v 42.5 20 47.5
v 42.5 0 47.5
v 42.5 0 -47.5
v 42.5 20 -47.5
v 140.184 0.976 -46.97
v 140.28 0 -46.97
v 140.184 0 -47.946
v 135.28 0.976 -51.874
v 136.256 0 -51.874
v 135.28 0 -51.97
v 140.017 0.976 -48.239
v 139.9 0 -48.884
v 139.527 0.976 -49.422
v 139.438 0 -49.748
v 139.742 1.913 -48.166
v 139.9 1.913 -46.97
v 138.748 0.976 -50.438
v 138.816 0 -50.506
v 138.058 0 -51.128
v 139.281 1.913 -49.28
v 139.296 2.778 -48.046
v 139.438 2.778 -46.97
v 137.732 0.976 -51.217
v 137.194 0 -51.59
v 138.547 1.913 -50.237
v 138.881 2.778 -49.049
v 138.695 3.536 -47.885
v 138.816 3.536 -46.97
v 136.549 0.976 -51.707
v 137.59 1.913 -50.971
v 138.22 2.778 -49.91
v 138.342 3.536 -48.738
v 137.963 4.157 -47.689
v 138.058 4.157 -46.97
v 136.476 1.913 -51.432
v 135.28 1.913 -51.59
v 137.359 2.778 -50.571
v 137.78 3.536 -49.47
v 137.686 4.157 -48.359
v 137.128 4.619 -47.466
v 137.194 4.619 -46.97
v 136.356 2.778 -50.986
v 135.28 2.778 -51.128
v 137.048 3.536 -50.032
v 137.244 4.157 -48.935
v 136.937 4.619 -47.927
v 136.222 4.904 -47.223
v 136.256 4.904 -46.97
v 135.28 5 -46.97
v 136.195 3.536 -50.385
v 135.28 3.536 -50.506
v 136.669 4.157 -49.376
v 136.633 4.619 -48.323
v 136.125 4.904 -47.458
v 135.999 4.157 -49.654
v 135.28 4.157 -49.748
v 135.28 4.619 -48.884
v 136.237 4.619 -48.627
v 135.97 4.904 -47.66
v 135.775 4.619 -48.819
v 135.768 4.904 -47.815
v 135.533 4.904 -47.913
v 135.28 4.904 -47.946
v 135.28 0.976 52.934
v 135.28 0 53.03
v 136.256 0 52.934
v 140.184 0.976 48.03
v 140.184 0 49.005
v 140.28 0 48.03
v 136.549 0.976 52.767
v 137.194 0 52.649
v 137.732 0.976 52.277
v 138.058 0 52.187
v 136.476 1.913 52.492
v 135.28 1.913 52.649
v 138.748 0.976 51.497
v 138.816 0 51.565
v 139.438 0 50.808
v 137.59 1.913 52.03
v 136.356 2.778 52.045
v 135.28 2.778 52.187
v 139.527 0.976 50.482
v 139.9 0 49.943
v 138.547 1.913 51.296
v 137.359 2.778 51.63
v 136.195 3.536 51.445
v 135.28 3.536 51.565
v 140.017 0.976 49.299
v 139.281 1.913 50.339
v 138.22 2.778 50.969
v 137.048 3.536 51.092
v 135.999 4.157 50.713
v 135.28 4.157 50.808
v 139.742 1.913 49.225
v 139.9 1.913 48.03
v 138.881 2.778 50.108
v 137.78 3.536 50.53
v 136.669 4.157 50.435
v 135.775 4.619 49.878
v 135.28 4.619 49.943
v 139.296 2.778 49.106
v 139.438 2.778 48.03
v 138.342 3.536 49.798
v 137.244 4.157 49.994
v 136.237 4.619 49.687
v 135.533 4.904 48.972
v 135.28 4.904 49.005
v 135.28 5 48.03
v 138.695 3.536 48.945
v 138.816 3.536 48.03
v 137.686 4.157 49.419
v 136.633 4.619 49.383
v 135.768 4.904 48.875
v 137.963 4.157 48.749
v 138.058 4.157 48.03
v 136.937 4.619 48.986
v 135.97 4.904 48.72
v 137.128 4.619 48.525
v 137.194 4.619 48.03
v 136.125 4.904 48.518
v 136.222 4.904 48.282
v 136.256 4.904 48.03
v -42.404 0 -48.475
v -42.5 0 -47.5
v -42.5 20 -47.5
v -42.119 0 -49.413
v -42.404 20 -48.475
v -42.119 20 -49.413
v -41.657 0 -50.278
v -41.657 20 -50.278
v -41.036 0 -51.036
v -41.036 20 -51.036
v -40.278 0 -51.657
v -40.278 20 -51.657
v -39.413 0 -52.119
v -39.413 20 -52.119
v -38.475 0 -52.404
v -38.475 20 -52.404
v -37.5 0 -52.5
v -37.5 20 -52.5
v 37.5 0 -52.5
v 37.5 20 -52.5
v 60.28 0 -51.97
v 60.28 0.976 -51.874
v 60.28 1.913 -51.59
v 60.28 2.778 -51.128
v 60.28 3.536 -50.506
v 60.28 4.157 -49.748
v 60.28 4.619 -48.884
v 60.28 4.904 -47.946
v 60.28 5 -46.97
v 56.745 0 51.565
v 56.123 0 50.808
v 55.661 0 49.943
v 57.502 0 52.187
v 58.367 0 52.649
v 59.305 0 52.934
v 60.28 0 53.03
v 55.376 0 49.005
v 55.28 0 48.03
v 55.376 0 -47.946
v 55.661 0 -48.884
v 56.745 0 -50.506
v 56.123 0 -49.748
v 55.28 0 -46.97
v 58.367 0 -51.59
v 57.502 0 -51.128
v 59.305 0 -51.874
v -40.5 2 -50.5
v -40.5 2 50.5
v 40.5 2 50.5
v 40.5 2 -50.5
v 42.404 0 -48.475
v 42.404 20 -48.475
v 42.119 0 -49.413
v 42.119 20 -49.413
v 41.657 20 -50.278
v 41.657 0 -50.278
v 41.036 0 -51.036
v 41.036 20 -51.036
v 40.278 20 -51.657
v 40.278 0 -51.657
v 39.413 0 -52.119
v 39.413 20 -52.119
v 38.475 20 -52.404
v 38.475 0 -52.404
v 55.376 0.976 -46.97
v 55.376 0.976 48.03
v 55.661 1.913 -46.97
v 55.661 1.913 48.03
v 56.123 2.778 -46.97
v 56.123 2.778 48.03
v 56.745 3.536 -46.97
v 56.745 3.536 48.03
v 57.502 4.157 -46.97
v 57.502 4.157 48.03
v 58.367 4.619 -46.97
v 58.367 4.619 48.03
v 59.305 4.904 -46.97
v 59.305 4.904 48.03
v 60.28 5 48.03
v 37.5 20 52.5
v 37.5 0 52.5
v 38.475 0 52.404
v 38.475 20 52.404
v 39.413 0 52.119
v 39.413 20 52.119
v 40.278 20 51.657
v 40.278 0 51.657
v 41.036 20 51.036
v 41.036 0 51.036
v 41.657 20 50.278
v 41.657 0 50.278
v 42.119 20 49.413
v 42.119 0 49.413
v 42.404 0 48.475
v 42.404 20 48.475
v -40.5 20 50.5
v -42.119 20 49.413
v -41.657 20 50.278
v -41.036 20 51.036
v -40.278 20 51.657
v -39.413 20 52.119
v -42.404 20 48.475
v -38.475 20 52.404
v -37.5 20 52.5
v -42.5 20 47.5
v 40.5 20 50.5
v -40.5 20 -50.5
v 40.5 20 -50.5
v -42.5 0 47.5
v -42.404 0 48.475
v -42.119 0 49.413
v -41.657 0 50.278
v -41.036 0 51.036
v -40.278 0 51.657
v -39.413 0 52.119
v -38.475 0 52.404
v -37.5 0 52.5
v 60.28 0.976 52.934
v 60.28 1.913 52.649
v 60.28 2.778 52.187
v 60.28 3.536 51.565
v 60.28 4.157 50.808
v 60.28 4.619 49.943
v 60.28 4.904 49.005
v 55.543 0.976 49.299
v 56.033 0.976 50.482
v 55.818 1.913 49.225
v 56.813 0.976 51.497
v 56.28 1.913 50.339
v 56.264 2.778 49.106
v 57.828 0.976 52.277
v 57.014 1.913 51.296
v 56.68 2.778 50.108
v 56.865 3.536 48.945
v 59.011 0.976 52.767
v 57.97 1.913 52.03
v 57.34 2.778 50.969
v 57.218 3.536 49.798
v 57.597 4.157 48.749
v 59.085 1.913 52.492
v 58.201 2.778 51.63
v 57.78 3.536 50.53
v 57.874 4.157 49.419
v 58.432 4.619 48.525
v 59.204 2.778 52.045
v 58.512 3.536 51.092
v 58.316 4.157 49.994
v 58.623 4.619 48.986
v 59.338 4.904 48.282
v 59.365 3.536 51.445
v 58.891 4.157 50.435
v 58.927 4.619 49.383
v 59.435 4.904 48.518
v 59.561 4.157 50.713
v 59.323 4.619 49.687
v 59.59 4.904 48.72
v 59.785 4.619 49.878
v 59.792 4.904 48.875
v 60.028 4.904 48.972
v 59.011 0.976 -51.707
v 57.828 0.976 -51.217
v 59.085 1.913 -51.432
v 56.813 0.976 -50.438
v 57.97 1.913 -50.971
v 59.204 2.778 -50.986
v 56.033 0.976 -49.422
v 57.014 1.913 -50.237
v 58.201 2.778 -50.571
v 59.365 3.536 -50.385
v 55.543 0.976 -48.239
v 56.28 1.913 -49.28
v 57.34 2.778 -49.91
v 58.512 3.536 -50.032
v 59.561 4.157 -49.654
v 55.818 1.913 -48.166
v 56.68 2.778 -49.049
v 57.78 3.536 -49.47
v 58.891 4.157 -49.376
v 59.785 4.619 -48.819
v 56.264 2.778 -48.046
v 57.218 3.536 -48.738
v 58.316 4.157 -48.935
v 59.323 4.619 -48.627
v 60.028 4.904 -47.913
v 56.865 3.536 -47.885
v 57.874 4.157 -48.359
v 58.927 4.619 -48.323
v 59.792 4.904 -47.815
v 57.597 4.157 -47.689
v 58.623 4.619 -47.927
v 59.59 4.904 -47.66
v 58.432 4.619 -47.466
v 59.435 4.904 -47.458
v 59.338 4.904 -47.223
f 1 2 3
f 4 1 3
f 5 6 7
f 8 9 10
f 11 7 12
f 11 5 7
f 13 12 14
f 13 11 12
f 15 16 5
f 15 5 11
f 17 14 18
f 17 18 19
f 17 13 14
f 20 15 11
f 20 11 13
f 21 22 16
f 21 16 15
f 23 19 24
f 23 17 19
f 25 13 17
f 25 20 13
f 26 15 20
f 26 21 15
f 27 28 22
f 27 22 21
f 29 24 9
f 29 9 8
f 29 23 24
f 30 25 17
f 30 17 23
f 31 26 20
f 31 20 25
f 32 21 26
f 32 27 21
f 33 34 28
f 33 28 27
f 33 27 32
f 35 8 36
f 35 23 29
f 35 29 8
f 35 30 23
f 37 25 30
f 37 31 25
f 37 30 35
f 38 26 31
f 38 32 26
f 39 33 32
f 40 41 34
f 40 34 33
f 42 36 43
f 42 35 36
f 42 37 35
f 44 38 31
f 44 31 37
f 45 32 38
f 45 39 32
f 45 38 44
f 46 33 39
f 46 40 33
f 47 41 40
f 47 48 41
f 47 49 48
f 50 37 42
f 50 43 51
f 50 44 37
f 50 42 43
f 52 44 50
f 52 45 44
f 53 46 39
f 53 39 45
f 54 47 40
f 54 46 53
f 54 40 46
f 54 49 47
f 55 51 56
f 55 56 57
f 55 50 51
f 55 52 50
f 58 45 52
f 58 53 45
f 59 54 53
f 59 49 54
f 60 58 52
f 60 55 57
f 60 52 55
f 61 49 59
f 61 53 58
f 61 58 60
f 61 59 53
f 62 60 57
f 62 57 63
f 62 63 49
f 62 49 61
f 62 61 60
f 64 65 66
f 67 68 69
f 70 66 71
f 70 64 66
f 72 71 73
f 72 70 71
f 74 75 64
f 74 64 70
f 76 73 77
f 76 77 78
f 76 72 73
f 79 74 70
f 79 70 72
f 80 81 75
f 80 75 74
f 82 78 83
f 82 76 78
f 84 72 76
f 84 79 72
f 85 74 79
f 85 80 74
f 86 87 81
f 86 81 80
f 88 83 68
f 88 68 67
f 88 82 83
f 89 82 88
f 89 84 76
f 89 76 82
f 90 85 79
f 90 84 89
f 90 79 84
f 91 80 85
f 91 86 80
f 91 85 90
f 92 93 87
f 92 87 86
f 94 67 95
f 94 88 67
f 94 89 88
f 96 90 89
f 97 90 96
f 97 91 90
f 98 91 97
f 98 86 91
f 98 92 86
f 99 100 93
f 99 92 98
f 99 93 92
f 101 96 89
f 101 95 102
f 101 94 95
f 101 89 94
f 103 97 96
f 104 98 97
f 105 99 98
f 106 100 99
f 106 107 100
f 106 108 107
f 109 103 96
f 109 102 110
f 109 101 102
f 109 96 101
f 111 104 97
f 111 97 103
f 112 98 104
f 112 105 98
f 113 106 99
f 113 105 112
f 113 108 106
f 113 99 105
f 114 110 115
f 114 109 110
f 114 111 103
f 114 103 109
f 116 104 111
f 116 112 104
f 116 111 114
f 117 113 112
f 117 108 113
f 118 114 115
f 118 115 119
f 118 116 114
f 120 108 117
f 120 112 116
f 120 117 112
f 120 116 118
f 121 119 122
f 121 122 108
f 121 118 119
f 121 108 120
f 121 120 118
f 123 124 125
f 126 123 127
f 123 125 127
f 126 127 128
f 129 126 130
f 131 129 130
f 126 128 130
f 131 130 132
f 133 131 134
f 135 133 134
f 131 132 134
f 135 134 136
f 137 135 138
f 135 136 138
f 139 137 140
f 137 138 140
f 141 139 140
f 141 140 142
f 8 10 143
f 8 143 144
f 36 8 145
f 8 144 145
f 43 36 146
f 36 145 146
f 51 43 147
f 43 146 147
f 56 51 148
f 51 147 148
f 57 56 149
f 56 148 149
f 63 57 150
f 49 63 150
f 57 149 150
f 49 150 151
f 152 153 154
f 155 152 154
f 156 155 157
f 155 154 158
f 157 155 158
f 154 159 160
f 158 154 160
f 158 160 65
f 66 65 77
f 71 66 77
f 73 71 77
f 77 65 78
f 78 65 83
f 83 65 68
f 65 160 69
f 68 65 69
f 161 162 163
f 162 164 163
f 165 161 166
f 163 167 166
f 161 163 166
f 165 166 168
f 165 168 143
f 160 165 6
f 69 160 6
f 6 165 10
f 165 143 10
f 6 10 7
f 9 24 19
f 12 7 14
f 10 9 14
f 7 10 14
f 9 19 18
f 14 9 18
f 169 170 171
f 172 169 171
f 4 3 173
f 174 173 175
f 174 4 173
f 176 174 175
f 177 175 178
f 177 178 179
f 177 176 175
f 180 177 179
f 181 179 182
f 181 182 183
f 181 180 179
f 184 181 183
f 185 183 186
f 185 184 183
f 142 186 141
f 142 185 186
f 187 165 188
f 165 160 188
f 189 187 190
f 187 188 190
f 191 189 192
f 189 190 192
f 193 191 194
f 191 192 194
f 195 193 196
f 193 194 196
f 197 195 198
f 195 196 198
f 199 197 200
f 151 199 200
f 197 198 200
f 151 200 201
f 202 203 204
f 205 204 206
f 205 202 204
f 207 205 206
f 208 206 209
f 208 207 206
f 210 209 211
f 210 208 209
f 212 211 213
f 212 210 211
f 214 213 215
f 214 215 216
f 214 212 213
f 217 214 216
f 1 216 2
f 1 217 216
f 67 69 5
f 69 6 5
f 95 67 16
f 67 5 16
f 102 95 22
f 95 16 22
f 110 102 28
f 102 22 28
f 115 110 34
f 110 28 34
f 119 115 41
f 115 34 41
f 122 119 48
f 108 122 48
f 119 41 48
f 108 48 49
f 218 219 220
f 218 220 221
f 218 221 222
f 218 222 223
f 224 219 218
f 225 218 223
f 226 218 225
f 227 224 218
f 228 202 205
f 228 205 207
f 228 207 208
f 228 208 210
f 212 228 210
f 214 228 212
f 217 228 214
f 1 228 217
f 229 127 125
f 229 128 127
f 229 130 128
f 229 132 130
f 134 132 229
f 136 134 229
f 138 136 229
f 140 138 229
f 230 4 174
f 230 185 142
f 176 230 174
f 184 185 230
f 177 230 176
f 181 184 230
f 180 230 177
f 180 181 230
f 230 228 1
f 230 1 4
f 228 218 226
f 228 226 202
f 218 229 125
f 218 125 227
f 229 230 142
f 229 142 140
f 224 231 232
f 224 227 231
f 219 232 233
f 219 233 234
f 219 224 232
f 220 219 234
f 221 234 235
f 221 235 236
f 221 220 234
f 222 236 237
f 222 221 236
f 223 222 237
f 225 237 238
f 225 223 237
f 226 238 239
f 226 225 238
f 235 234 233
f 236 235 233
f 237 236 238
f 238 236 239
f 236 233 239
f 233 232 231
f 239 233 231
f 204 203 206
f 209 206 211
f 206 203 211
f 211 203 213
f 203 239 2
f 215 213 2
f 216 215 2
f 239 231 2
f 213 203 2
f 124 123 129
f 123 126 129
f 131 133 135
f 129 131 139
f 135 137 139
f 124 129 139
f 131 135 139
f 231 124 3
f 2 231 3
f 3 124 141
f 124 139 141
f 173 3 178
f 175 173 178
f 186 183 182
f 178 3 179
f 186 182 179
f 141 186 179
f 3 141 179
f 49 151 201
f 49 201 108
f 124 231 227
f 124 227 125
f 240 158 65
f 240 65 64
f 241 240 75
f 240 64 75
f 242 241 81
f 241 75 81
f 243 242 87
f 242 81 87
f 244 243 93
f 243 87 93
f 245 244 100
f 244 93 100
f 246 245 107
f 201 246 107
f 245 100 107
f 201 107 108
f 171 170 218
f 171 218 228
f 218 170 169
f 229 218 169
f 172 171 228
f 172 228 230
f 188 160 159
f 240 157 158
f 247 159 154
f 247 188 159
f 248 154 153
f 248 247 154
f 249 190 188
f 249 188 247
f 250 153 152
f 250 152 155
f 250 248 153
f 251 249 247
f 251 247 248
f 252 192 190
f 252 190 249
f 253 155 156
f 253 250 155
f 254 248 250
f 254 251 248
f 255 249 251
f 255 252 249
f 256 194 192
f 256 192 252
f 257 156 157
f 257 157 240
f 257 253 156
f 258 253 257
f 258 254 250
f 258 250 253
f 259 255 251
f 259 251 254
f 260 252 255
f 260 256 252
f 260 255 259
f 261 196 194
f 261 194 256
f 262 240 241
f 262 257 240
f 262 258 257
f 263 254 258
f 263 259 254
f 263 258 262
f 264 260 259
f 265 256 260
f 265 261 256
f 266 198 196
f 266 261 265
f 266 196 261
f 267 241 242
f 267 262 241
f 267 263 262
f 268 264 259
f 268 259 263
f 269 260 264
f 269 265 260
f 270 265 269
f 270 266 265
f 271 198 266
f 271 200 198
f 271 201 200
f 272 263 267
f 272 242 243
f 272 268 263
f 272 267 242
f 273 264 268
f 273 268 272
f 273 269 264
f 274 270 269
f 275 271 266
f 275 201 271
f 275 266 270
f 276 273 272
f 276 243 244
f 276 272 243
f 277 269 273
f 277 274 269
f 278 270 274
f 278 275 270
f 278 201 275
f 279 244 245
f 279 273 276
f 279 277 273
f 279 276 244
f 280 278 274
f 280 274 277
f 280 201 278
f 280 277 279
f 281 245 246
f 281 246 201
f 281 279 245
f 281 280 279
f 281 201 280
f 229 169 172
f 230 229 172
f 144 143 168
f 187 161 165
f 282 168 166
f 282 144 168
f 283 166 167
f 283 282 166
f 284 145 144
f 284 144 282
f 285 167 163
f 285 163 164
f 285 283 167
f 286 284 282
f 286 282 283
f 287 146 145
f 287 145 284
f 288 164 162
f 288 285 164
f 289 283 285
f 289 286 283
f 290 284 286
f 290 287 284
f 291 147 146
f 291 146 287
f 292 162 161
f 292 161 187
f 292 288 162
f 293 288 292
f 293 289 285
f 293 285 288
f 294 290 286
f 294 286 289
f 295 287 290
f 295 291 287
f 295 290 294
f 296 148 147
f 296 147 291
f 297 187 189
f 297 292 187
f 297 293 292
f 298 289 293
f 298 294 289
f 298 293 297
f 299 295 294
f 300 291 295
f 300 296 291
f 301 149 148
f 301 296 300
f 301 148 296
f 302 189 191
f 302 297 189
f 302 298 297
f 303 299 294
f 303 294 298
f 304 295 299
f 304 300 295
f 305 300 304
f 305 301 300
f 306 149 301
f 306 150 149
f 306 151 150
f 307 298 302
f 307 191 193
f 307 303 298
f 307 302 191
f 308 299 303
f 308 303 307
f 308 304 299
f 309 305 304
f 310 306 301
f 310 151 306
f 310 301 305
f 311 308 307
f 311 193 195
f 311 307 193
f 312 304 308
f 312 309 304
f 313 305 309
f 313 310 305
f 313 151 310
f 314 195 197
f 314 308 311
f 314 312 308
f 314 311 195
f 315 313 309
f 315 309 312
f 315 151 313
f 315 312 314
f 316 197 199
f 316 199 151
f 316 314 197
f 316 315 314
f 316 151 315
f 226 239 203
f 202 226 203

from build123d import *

# Parameters (mm, degrees)
SKETCH1_W           = 85
SKETCH1_H           = 105
BOSS_EXTRUDE1_DEPTH = 20
SHELL1_T            = -2
SKETCH2_W           = 85
SKETCH2_H           = 105
BOSS_EXTRUDE2_DEPTH = 5
FILLET1_R           = 5
FILLET2_R           = 5
FILLET3_R           = 5


with BuildPart() as part:
    # Sketch1 → Boss-Extrude1 (new body)
    with BuildSketch(Plane(origin=(0, 0, 0), x_dir=(1, 0, 0), z_dir=(0, 1, 0))):
        Rectangle(SKETCH1_W, SKETCH1_H)
    extrude(amount=BOSS_EXTRUDE1_DEPTH)

    # Shell1
    shell1_openings = [part.faces().sort_by_distance(p)[0] for p in [
        (0, 20, 0),
    ]]
    offset(amount=SHELL1_T, openings=shell1_openings, kind=Kind.INTERSECTION)

    # Fillet1
    fillet1_edges = [part.edges().sort_by_distance(p)[0] for p in [
        (42.5, 10, 52.5),
        (-42.5, 10, 52.5),
        (-42.5, 10, -52.5),
        (42.5, 10, -52.5),
    ]]
    fillet(fillet1_edges, radius=FILLET1_R)


with BuildPart() as body_2:
    # Sketch2 → Boss-Extrude2 (new body)
    with BuildSketch(Plane(origin=(11.543615237, 0, 0), x_dir=(1, 0, 0), z_dir=(0, 1, 0))):
        with Locations((86.236548959, -0.529735839)):
            Rectangle(SKETCH2_W, SKETCH2_H)
    extrude(amount=BOSS_EXTRUDE2_DEPTH)

    # Fillet2
    fillet2_edges = [body_2.edges().sort_by_distance(p)[0] for p in [
        (55.280164195, 2.5, -51.970264161),
        (140.280164195, 2.5, -51.970264161),
        (140.280164195, 2.5, 53.029735839),
        (55.280164195, 2.5, 53.029735839),
    ]]
    fillet(fillet2_edges, radius=FILLET2_R)

    # Fillet3
    fillet3_edges = [body_2.edges().sort_by_distance(p)[0] for p in [
        (56.744630289, 5, 51.565269745),
        (55.280164195, 5, 0.529735839),
        (56.744630289, 5, -50.505798067),
        (97.780164195, 5, -51.970264161),
        (138.815698101, 5, -50.505798067),
        (140.280164195, 5, 0.529735839),
        (138.815698101, 5, 51.565269745),
        (97.780164195, 5, 53.029735839),
    ]]
    fillet(fillet3_edges, radius=FILLET3_R - 0.0001)  # a hair under: the kernel refuses the full size


solid = Compound([part.part, body_2.part])
